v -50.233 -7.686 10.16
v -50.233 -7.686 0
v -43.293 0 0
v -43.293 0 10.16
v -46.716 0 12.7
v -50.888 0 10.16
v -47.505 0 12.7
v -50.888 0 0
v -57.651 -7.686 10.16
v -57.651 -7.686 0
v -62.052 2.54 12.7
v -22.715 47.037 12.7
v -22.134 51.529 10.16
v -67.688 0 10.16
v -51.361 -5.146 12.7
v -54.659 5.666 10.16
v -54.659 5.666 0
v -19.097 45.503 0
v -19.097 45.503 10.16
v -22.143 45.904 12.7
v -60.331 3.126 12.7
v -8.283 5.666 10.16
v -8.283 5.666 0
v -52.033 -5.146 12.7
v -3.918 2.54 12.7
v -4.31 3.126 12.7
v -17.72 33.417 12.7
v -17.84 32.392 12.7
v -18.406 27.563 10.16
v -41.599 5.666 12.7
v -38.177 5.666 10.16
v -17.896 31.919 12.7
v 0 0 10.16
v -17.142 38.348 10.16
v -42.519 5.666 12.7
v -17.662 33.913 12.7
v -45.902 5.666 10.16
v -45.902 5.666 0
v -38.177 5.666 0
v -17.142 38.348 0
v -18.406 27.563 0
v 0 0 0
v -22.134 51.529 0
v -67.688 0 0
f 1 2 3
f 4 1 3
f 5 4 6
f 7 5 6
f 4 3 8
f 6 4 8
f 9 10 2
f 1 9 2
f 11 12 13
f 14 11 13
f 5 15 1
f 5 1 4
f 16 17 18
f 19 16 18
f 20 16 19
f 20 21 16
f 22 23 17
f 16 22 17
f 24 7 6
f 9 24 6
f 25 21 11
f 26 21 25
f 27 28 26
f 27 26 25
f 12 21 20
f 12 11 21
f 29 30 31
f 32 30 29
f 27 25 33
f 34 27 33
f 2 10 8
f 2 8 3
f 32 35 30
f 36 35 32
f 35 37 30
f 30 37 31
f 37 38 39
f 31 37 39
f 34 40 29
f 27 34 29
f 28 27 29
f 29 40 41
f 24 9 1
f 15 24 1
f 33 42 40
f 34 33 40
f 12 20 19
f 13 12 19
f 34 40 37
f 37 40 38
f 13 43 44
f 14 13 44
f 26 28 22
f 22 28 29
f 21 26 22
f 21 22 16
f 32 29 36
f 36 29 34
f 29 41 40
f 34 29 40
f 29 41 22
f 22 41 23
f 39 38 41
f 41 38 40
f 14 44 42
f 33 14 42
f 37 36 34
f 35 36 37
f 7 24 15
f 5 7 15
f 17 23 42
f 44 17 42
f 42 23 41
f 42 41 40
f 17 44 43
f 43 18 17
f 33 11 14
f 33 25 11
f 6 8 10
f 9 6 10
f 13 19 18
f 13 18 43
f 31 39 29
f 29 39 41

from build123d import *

# Parameters (mm, degrees)
F1_DEPTH  = 12.7
F2_DEPTH  = 12.7
F3_SIZE   = 2.54
F3_2_SIZE = 2.54
F3_3_SIZE = 2.54


with BuildPart() as f1:
    # F0 (on Top) → F1 (new body)
    with BuildSketch(Plane.XY):
        Polygon((-17.142418772, 38.3483767509), (-45.9020223429, 5.6663663127), (-38.1771805871, 5.6663663127), (-18.4063371271, 27.5632161647), align=None)
    extrude(amount=F1_DEPTH)

    # F3#2
    f3_2_edges = [f1.edges().sort_by_distance(p)[0] for p in [
        (-28.291759, 16.614791, 12.7),
        (-31.522221, 22.007372, 12.7),
    ]]
    chamfer(f3_2_edges, length=F3_2_SIZE)


with BuildPart() as f1b:
    # F0 (on Top) → F1, piece 2 (new body)
    with BuildSketch(Plane.XY):
        Polygon((-43.2933887226, 0), (-50.8883266324, 0), (-57.6514452696, -7.6855132356), (-50.2327010036, -7.6855132356), align=None)
    extrude(amount=F1_DEPTH)

    # F3#3
    f3_3_edges = [f1b.edges().sort_by_distance(p)[0] for p in [
        (-46.763045, -3.842757, 12.7),
        (-54.269886, -3.842757, 12.7),
        (-53.942073, -7.685513, 12.7),
    ]]
    chamfer(f3_3_edges, length=F3_3_SIZE)


with BuildPart() as f2:
    # F0 (on Top) → F2 (new body)
    with BuildSketch(Plane.XY):
        Polygon((0, 0), (-17.142418772, 38.3483767509), (-18.4063371271, 27.5632161647), (-8.2830116153, 5.6663663127), (-38.1771805871, 5.6663663127), (-43.2933887226, 0), align=None)
        Polygon((-38.1771805871, 5.6663663127), (-45.9020223429, 5.6663663127), (-50.8883266324, 0), (-43.2933887226, 0), align=None)
        Polygon((-54.6591710989, 5.6663663127), (-19.0966203809, 45.5031730235), (-22.1344456077, 51.5287555754), (-67.6876604557, 0), (-59.7175695002, 0), (-50.8883266324, 0), (-45.9020223429, 5.6663663127), align=None)
    extrude(amount=F2_DEPTH)

    # F3
    f3_edges = [f2.edges().sort_by_distance(p)[0] for p in [
        (-33.84383, 0, 12.7),
        (-31.471091, 5.666366, 12.7),
        (-13.344674, 16.614791, 12.7),
        (-8.571209, 19.174188, 12.7),
        (-44.911053, 25.764378, 12.7),
        (-36.877896, 25.58477, 12.7),
        (-20.615533, 48.515964, 12.7),
    ]]
    chamfer(f3_edges, length=F3_SIZE)


solid = Compound([f1.part, f1b.part, f2.part])
